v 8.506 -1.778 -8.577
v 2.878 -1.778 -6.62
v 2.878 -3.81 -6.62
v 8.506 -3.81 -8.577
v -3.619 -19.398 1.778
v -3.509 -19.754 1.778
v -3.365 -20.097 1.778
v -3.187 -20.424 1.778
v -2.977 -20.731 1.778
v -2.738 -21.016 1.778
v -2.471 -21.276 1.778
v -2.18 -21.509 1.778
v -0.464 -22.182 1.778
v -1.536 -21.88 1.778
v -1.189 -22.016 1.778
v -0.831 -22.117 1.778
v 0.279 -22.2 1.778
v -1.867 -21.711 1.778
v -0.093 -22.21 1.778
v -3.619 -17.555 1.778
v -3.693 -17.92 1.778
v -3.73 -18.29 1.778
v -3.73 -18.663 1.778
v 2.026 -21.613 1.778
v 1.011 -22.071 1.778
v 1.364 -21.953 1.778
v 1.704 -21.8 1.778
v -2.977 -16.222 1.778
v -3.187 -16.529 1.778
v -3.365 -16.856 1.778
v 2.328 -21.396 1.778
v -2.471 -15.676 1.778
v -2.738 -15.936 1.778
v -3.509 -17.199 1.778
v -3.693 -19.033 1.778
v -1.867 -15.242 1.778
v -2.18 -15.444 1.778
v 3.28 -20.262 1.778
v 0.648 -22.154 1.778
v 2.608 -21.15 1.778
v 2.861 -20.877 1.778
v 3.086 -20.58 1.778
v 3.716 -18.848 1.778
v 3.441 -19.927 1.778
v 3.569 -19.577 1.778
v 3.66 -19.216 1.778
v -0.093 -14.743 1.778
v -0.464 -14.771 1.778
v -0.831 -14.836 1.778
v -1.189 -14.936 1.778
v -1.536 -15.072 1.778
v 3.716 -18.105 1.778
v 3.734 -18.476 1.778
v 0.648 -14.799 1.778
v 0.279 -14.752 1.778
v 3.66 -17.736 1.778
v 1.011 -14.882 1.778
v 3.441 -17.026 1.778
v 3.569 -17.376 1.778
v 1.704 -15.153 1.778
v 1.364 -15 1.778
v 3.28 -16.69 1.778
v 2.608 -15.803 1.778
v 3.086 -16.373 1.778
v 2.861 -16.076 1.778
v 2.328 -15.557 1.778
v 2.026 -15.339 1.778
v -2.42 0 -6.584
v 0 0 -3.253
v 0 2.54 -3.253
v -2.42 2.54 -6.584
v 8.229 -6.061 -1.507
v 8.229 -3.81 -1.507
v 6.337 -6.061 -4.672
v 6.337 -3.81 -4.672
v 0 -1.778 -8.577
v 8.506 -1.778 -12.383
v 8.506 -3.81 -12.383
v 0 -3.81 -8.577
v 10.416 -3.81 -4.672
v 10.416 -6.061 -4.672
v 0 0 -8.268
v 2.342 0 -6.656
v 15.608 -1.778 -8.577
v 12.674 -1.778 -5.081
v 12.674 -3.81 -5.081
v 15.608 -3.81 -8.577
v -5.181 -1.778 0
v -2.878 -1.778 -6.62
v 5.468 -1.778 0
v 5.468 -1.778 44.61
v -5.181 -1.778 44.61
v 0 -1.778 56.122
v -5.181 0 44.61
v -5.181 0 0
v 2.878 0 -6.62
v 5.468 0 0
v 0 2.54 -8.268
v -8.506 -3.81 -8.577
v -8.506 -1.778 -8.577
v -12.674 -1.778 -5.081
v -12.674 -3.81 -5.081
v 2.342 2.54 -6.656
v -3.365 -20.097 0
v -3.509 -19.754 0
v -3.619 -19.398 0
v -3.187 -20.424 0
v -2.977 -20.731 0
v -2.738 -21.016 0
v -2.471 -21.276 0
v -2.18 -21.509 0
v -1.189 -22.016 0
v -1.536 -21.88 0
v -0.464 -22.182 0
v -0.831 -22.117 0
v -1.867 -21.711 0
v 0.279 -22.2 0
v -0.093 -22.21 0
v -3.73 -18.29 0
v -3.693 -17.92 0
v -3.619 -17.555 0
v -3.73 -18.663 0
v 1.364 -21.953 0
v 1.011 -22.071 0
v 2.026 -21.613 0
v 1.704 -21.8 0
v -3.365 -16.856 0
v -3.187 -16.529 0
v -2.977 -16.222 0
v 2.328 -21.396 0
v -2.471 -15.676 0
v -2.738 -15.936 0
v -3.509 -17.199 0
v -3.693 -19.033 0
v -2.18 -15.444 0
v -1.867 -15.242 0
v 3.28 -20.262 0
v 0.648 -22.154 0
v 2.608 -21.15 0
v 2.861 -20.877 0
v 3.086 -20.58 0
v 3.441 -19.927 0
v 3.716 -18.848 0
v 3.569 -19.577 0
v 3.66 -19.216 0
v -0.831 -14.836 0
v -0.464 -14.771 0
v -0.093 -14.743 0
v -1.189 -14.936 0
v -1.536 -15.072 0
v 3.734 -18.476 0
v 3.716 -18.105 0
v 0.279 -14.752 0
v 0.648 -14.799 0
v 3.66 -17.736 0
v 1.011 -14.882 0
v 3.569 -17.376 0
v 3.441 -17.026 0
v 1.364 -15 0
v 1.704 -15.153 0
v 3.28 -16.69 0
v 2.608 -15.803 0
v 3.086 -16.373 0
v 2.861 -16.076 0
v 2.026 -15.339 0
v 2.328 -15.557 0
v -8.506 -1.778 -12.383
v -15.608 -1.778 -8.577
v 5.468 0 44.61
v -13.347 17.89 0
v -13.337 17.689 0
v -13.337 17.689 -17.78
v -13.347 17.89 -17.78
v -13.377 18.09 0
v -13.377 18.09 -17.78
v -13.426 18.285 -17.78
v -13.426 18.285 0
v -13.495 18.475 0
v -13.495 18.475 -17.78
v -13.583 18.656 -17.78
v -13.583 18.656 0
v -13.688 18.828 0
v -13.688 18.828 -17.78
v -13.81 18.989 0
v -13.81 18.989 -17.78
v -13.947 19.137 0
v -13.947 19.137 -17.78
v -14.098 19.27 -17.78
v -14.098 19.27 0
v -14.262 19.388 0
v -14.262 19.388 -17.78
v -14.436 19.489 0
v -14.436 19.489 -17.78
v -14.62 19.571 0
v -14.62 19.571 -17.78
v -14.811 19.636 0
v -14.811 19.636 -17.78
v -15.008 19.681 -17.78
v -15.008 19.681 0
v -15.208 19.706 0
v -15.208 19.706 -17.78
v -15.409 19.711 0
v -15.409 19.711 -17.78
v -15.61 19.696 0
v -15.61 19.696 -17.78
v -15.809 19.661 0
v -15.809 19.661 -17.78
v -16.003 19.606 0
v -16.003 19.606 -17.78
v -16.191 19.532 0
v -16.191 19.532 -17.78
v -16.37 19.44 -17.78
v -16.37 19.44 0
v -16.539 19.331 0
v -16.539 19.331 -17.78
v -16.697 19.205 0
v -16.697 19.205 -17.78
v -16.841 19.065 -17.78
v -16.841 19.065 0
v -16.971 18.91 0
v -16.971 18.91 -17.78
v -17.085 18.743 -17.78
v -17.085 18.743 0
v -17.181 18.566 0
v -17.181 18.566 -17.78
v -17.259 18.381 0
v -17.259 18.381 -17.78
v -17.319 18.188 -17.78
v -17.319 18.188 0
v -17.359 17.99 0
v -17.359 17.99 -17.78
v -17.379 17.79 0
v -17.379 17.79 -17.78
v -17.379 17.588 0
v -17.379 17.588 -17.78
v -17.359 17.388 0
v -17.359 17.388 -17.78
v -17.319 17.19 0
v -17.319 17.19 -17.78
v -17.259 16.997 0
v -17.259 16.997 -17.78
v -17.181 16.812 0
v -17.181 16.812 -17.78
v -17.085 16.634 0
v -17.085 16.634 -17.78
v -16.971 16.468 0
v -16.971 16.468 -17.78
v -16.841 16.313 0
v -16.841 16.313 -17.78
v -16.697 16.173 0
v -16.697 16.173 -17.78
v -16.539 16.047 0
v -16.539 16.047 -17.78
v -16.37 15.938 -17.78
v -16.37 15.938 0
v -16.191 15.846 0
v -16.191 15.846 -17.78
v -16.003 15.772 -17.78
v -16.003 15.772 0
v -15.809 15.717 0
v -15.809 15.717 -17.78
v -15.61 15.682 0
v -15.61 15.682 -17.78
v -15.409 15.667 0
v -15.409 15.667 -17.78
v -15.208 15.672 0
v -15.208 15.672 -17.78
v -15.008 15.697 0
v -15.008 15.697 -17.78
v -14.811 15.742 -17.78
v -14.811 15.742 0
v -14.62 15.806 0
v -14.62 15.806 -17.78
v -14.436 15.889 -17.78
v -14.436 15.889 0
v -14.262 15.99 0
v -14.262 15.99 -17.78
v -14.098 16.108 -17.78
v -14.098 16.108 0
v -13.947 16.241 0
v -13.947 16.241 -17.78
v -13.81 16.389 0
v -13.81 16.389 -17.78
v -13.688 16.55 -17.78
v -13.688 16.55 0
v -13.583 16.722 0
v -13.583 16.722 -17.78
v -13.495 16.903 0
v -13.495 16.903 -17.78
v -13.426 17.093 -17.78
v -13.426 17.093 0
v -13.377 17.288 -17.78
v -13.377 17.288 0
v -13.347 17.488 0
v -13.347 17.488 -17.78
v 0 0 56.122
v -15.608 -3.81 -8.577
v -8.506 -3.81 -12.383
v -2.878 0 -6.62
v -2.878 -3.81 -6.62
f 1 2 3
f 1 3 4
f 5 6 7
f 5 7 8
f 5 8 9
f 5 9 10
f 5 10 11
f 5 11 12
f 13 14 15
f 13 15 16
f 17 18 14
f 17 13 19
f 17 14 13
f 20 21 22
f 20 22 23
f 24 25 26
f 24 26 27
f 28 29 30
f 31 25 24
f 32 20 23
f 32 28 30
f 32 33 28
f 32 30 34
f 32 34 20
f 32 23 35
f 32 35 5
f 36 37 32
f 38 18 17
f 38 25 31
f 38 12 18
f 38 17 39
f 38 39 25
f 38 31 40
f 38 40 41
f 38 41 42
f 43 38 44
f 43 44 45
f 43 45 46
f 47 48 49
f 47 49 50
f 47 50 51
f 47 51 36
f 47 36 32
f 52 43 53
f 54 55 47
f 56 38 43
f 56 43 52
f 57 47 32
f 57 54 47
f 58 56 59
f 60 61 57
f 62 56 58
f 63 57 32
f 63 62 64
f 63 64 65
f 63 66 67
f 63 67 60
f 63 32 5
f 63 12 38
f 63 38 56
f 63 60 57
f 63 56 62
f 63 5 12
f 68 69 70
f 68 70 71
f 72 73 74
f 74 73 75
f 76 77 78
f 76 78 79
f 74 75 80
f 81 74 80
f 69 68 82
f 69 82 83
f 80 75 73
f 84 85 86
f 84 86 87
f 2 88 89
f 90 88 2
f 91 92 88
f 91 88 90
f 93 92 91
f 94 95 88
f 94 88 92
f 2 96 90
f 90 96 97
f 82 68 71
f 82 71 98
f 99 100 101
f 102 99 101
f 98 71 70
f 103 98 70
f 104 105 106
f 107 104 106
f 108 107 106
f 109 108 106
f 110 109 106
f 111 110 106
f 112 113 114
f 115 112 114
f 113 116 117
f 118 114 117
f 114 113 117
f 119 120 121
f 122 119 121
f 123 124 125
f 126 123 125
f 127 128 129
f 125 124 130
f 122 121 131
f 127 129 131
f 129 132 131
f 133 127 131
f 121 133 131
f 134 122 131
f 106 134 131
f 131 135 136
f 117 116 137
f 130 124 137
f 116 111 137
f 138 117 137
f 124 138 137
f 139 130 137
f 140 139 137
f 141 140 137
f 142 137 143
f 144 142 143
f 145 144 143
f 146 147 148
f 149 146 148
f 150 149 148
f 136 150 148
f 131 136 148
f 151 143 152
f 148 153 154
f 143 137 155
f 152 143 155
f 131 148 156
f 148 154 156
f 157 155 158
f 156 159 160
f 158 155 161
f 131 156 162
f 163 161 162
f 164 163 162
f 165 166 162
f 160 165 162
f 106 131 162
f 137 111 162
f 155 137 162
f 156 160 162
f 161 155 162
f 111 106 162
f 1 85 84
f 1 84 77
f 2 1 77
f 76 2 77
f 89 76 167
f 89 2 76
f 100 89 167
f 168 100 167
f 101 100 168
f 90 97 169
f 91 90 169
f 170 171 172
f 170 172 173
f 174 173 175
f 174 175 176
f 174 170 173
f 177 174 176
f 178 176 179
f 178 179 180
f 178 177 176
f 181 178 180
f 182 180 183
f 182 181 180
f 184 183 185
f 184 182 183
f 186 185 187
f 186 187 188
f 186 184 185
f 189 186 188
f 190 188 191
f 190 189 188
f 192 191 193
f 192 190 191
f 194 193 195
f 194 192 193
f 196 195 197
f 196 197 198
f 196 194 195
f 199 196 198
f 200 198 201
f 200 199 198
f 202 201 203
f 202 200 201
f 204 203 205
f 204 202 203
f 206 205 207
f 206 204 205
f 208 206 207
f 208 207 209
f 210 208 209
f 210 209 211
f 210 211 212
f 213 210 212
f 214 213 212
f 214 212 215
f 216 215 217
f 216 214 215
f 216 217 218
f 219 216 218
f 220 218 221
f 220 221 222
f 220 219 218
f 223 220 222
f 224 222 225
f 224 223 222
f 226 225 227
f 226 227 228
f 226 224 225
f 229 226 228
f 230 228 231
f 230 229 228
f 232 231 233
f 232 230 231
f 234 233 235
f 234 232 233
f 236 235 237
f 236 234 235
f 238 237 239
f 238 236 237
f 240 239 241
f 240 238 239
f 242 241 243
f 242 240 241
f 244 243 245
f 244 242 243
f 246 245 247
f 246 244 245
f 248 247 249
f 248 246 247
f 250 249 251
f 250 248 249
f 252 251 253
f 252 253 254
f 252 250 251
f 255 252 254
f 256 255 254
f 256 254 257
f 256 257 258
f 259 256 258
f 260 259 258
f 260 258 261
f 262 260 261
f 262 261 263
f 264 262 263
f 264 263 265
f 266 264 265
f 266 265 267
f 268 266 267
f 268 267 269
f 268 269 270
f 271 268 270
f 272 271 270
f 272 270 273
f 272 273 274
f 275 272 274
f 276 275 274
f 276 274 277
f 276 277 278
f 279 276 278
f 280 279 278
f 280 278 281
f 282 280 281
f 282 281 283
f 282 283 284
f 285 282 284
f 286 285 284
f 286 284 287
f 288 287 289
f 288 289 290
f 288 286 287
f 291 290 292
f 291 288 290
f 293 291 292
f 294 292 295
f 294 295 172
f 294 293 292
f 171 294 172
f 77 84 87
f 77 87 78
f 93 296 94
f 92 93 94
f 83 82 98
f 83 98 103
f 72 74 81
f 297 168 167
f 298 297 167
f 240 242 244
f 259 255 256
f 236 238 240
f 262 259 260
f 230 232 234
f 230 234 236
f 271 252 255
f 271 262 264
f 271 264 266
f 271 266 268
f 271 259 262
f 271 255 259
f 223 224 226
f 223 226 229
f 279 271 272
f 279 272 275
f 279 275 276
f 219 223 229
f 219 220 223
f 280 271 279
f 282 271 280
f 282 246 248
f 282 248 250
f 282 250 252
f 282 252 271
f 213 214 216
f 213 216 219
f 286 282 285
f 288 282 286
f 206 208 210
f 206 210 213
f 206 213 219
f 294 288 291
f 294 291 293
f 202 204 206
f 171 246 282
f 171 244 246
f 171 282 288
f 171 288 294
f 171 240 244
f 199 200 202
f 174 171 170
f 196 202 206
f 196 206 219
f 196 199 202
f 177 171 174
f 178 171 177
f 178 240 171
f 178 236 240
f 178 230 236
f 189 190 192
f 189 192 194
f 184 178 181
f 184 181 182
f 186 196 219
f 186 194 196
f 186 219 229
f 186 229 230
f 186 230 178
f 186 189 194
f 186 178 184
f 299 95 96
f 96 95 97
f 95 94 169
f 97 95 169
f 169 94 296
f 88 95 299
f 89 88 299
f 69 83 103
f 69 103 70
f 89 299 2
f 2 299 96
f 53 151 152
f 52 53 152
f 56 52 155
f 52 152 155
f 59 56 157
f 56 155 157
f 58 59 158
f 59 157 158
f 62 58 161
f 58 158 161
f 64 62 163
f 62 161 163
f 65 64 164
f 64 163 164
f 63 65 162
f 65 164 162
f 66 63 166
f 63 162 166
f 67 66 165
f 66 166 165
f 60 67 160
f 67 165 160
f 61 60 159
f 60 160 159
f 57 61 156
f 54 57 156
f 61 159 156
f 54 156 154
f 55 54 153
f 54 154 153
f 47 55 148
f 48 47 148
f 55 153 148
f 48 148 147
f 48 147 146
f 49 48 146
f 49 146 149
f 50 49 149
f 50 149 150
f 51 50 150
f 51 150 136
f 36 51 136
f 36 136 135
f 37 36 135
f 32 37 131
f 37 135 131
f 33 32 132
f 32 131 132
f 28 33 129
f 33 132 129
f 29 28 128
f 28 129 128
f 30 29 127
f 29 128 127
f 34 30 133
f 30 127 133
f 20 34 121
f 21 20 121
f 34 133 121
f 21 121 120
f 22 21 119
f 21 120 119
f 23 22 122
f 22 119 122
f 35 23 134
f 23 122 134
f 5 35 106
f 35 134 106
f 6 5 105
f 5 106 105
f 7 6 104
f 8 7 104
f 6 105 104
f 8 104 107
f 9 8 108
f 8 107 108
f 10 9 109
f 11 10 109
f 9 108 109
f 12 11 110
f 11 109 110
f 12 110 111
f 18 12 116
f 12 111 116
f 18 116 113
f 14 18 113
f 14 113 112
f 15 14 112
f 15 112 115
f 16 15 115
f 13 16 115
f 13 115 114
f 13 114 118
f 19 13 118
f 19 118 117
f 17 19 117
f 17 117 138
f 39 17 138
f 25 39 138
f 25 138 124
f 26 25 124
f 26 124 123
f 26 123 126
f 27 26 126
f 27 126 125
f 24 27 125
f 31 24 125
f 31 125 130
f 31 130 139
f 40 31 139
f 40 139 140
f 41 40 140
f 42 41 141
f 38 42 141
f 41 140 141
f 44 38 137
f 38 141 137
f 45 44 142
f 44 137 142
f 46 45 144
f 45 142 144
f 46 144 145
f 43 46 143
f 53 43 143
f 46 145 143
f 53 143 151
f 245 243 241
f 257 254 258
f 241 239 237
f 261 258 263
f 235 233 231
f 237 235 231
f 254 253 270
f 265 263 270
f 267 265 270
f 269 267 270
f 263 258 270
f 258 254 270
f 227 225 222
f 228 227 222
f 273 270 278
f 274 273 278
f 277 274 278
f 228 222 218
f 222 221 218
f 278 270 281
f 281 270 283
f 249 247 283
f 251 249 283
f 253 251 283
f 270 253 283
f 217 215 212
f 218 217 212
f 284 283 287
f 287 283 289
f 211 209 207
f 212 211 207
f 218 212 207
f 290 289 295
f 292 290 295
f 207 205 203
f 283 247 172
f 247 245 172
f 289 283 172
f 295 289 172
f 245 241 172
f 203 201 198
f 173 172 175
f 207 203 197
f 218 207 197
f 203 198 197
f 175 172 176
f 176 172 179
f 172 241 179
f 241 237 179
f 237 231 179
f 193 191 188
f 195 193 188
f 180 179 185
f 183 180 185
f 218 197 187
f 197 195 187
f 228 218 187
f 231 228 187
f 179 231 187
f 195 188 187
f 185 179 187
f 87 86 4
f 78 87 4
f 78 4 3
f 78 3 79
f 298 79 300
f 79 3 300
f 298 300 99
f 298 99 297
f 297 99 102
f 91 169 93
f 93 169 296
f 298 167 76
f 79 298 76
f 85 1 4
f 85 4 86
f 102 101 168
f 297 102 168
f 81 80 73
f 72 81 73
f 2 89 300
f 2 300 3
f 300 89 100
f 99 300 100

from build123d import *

# Parameters (mm, degrees)
F0_W      = 10.6488130987
F0_H      = 44.6098931134
F1_DEPTH  = 1.778
F3_DEPTH  = 2.032
F5_R      = 2.0222961145
F6_DEPTH  = 17.78
F8_DEPTH  = 2.54
F9_DEPTH  = 2.54
F11_R     = 3.7344382379
F12_DEPTH = 1.778
F14_DEPTH = 1.718325424
F15_DEPTH = 0.532413309


with BuildPart() as f1:
    # F0 (on Front) → F1 (new body)
    with BuildSketch(Plane.XZ):
        Polygon((5.468309857, 44.6098931134), (0, 56.1221241951), (-5.1805032417, 44.6098931134), align=None)
        with Locations((0.1439033076, 22.3049465567)):
            Rectangle(F0_W, F0_H)
        Polygon((5.468309857, 0), (-5.1805032417, 0), (-2.8780580033, -6.6195321269), (2.8780589346, -6.6195321269), align=None)
    extrude(amount=F1_DEPTH)



with BuildPart() as f3:
    # F2 (on face) → F3 (new body)
    with BuildSketch(Plane.XZ.offset(1.778)):
        Polygon((0, -6.6195321269), (-2.8780580033, -6.6195321269), (-8.5061782339, -8.5771385526), (-12.6744834706, -5.0805849023), (-15.607543008, -8.5771385526), (-8.5061782339, -12.3831816018), (0, -8.5771385526), align=None)
    extrude(amount=F3_DEPTH)


with BuildPart() as f1_1:
    add(f1.part)

    add(f3.part)  # F4 merges F3
    # F4: F3 across plane
    add(f3.part.mirror(Plane.YZ))


with BuildPart() as f6:
    # F5 (on Top) → F6 (new body)
    with BuildSketch(Plane.XY):
        with Locations((-15.3589062393, 17.6889896393)):
            Circle(F5_R)
    extrude(amount=-F6_DEPTH)


with BuildPart() as f8:
    # F7 (on Front) → F8 (new body)
    with BuildSketch(Plane.XZ):
        Polygon((0, -3.2533295453), (-2.4197467137, -6.58383267), (0, -8.2675448509), (2.3415875621, -6.6562923603), align=None)
    extrude(amount=F8_DEPTH)


with BuildPart() as f9:
    # F9 (new): a face of the model
    f9_faces = [f8.part.faces().sort_by_distance(p)[0] for p in [
        (-0.0260530505, 0, -6.0467807281),
    ]]
    extrude(f9_faces, amount=F9_DEPTH)


with BuildPart() as f12:
    # F11 (on Top) → F12 (new body)
    with BuildSketch(Plane.XY):
        with Locations((0, -18.4763986617)):
            Circle(F11_R)
    extrude(amount=F12_DEPTH)


with BuildPart() as f14:
    # F13 (on face) → F14 (new body)
    with BuildSketch(Plane.XZ.offset(3.81)):
        Polygon((10.4160495102, -4.6717626974), (8.2294549793, -1.5068473294), (6.3372692093, -4.6717626974), align=None)
    extrude(amount=F14_DEPTH)

    # F15 (add): a face of the model
    f15_faces = [f14.faces().sort_by_distance(p)[0] for p in [
        (8.327591233, -5.528325424, -3.6167909081),
    ]]
    extrude(f15_faces, amount=F15_DEPTH)


solid = Compound([f1_1.part, f6.part, f9.part, f12.part, f14.part])
